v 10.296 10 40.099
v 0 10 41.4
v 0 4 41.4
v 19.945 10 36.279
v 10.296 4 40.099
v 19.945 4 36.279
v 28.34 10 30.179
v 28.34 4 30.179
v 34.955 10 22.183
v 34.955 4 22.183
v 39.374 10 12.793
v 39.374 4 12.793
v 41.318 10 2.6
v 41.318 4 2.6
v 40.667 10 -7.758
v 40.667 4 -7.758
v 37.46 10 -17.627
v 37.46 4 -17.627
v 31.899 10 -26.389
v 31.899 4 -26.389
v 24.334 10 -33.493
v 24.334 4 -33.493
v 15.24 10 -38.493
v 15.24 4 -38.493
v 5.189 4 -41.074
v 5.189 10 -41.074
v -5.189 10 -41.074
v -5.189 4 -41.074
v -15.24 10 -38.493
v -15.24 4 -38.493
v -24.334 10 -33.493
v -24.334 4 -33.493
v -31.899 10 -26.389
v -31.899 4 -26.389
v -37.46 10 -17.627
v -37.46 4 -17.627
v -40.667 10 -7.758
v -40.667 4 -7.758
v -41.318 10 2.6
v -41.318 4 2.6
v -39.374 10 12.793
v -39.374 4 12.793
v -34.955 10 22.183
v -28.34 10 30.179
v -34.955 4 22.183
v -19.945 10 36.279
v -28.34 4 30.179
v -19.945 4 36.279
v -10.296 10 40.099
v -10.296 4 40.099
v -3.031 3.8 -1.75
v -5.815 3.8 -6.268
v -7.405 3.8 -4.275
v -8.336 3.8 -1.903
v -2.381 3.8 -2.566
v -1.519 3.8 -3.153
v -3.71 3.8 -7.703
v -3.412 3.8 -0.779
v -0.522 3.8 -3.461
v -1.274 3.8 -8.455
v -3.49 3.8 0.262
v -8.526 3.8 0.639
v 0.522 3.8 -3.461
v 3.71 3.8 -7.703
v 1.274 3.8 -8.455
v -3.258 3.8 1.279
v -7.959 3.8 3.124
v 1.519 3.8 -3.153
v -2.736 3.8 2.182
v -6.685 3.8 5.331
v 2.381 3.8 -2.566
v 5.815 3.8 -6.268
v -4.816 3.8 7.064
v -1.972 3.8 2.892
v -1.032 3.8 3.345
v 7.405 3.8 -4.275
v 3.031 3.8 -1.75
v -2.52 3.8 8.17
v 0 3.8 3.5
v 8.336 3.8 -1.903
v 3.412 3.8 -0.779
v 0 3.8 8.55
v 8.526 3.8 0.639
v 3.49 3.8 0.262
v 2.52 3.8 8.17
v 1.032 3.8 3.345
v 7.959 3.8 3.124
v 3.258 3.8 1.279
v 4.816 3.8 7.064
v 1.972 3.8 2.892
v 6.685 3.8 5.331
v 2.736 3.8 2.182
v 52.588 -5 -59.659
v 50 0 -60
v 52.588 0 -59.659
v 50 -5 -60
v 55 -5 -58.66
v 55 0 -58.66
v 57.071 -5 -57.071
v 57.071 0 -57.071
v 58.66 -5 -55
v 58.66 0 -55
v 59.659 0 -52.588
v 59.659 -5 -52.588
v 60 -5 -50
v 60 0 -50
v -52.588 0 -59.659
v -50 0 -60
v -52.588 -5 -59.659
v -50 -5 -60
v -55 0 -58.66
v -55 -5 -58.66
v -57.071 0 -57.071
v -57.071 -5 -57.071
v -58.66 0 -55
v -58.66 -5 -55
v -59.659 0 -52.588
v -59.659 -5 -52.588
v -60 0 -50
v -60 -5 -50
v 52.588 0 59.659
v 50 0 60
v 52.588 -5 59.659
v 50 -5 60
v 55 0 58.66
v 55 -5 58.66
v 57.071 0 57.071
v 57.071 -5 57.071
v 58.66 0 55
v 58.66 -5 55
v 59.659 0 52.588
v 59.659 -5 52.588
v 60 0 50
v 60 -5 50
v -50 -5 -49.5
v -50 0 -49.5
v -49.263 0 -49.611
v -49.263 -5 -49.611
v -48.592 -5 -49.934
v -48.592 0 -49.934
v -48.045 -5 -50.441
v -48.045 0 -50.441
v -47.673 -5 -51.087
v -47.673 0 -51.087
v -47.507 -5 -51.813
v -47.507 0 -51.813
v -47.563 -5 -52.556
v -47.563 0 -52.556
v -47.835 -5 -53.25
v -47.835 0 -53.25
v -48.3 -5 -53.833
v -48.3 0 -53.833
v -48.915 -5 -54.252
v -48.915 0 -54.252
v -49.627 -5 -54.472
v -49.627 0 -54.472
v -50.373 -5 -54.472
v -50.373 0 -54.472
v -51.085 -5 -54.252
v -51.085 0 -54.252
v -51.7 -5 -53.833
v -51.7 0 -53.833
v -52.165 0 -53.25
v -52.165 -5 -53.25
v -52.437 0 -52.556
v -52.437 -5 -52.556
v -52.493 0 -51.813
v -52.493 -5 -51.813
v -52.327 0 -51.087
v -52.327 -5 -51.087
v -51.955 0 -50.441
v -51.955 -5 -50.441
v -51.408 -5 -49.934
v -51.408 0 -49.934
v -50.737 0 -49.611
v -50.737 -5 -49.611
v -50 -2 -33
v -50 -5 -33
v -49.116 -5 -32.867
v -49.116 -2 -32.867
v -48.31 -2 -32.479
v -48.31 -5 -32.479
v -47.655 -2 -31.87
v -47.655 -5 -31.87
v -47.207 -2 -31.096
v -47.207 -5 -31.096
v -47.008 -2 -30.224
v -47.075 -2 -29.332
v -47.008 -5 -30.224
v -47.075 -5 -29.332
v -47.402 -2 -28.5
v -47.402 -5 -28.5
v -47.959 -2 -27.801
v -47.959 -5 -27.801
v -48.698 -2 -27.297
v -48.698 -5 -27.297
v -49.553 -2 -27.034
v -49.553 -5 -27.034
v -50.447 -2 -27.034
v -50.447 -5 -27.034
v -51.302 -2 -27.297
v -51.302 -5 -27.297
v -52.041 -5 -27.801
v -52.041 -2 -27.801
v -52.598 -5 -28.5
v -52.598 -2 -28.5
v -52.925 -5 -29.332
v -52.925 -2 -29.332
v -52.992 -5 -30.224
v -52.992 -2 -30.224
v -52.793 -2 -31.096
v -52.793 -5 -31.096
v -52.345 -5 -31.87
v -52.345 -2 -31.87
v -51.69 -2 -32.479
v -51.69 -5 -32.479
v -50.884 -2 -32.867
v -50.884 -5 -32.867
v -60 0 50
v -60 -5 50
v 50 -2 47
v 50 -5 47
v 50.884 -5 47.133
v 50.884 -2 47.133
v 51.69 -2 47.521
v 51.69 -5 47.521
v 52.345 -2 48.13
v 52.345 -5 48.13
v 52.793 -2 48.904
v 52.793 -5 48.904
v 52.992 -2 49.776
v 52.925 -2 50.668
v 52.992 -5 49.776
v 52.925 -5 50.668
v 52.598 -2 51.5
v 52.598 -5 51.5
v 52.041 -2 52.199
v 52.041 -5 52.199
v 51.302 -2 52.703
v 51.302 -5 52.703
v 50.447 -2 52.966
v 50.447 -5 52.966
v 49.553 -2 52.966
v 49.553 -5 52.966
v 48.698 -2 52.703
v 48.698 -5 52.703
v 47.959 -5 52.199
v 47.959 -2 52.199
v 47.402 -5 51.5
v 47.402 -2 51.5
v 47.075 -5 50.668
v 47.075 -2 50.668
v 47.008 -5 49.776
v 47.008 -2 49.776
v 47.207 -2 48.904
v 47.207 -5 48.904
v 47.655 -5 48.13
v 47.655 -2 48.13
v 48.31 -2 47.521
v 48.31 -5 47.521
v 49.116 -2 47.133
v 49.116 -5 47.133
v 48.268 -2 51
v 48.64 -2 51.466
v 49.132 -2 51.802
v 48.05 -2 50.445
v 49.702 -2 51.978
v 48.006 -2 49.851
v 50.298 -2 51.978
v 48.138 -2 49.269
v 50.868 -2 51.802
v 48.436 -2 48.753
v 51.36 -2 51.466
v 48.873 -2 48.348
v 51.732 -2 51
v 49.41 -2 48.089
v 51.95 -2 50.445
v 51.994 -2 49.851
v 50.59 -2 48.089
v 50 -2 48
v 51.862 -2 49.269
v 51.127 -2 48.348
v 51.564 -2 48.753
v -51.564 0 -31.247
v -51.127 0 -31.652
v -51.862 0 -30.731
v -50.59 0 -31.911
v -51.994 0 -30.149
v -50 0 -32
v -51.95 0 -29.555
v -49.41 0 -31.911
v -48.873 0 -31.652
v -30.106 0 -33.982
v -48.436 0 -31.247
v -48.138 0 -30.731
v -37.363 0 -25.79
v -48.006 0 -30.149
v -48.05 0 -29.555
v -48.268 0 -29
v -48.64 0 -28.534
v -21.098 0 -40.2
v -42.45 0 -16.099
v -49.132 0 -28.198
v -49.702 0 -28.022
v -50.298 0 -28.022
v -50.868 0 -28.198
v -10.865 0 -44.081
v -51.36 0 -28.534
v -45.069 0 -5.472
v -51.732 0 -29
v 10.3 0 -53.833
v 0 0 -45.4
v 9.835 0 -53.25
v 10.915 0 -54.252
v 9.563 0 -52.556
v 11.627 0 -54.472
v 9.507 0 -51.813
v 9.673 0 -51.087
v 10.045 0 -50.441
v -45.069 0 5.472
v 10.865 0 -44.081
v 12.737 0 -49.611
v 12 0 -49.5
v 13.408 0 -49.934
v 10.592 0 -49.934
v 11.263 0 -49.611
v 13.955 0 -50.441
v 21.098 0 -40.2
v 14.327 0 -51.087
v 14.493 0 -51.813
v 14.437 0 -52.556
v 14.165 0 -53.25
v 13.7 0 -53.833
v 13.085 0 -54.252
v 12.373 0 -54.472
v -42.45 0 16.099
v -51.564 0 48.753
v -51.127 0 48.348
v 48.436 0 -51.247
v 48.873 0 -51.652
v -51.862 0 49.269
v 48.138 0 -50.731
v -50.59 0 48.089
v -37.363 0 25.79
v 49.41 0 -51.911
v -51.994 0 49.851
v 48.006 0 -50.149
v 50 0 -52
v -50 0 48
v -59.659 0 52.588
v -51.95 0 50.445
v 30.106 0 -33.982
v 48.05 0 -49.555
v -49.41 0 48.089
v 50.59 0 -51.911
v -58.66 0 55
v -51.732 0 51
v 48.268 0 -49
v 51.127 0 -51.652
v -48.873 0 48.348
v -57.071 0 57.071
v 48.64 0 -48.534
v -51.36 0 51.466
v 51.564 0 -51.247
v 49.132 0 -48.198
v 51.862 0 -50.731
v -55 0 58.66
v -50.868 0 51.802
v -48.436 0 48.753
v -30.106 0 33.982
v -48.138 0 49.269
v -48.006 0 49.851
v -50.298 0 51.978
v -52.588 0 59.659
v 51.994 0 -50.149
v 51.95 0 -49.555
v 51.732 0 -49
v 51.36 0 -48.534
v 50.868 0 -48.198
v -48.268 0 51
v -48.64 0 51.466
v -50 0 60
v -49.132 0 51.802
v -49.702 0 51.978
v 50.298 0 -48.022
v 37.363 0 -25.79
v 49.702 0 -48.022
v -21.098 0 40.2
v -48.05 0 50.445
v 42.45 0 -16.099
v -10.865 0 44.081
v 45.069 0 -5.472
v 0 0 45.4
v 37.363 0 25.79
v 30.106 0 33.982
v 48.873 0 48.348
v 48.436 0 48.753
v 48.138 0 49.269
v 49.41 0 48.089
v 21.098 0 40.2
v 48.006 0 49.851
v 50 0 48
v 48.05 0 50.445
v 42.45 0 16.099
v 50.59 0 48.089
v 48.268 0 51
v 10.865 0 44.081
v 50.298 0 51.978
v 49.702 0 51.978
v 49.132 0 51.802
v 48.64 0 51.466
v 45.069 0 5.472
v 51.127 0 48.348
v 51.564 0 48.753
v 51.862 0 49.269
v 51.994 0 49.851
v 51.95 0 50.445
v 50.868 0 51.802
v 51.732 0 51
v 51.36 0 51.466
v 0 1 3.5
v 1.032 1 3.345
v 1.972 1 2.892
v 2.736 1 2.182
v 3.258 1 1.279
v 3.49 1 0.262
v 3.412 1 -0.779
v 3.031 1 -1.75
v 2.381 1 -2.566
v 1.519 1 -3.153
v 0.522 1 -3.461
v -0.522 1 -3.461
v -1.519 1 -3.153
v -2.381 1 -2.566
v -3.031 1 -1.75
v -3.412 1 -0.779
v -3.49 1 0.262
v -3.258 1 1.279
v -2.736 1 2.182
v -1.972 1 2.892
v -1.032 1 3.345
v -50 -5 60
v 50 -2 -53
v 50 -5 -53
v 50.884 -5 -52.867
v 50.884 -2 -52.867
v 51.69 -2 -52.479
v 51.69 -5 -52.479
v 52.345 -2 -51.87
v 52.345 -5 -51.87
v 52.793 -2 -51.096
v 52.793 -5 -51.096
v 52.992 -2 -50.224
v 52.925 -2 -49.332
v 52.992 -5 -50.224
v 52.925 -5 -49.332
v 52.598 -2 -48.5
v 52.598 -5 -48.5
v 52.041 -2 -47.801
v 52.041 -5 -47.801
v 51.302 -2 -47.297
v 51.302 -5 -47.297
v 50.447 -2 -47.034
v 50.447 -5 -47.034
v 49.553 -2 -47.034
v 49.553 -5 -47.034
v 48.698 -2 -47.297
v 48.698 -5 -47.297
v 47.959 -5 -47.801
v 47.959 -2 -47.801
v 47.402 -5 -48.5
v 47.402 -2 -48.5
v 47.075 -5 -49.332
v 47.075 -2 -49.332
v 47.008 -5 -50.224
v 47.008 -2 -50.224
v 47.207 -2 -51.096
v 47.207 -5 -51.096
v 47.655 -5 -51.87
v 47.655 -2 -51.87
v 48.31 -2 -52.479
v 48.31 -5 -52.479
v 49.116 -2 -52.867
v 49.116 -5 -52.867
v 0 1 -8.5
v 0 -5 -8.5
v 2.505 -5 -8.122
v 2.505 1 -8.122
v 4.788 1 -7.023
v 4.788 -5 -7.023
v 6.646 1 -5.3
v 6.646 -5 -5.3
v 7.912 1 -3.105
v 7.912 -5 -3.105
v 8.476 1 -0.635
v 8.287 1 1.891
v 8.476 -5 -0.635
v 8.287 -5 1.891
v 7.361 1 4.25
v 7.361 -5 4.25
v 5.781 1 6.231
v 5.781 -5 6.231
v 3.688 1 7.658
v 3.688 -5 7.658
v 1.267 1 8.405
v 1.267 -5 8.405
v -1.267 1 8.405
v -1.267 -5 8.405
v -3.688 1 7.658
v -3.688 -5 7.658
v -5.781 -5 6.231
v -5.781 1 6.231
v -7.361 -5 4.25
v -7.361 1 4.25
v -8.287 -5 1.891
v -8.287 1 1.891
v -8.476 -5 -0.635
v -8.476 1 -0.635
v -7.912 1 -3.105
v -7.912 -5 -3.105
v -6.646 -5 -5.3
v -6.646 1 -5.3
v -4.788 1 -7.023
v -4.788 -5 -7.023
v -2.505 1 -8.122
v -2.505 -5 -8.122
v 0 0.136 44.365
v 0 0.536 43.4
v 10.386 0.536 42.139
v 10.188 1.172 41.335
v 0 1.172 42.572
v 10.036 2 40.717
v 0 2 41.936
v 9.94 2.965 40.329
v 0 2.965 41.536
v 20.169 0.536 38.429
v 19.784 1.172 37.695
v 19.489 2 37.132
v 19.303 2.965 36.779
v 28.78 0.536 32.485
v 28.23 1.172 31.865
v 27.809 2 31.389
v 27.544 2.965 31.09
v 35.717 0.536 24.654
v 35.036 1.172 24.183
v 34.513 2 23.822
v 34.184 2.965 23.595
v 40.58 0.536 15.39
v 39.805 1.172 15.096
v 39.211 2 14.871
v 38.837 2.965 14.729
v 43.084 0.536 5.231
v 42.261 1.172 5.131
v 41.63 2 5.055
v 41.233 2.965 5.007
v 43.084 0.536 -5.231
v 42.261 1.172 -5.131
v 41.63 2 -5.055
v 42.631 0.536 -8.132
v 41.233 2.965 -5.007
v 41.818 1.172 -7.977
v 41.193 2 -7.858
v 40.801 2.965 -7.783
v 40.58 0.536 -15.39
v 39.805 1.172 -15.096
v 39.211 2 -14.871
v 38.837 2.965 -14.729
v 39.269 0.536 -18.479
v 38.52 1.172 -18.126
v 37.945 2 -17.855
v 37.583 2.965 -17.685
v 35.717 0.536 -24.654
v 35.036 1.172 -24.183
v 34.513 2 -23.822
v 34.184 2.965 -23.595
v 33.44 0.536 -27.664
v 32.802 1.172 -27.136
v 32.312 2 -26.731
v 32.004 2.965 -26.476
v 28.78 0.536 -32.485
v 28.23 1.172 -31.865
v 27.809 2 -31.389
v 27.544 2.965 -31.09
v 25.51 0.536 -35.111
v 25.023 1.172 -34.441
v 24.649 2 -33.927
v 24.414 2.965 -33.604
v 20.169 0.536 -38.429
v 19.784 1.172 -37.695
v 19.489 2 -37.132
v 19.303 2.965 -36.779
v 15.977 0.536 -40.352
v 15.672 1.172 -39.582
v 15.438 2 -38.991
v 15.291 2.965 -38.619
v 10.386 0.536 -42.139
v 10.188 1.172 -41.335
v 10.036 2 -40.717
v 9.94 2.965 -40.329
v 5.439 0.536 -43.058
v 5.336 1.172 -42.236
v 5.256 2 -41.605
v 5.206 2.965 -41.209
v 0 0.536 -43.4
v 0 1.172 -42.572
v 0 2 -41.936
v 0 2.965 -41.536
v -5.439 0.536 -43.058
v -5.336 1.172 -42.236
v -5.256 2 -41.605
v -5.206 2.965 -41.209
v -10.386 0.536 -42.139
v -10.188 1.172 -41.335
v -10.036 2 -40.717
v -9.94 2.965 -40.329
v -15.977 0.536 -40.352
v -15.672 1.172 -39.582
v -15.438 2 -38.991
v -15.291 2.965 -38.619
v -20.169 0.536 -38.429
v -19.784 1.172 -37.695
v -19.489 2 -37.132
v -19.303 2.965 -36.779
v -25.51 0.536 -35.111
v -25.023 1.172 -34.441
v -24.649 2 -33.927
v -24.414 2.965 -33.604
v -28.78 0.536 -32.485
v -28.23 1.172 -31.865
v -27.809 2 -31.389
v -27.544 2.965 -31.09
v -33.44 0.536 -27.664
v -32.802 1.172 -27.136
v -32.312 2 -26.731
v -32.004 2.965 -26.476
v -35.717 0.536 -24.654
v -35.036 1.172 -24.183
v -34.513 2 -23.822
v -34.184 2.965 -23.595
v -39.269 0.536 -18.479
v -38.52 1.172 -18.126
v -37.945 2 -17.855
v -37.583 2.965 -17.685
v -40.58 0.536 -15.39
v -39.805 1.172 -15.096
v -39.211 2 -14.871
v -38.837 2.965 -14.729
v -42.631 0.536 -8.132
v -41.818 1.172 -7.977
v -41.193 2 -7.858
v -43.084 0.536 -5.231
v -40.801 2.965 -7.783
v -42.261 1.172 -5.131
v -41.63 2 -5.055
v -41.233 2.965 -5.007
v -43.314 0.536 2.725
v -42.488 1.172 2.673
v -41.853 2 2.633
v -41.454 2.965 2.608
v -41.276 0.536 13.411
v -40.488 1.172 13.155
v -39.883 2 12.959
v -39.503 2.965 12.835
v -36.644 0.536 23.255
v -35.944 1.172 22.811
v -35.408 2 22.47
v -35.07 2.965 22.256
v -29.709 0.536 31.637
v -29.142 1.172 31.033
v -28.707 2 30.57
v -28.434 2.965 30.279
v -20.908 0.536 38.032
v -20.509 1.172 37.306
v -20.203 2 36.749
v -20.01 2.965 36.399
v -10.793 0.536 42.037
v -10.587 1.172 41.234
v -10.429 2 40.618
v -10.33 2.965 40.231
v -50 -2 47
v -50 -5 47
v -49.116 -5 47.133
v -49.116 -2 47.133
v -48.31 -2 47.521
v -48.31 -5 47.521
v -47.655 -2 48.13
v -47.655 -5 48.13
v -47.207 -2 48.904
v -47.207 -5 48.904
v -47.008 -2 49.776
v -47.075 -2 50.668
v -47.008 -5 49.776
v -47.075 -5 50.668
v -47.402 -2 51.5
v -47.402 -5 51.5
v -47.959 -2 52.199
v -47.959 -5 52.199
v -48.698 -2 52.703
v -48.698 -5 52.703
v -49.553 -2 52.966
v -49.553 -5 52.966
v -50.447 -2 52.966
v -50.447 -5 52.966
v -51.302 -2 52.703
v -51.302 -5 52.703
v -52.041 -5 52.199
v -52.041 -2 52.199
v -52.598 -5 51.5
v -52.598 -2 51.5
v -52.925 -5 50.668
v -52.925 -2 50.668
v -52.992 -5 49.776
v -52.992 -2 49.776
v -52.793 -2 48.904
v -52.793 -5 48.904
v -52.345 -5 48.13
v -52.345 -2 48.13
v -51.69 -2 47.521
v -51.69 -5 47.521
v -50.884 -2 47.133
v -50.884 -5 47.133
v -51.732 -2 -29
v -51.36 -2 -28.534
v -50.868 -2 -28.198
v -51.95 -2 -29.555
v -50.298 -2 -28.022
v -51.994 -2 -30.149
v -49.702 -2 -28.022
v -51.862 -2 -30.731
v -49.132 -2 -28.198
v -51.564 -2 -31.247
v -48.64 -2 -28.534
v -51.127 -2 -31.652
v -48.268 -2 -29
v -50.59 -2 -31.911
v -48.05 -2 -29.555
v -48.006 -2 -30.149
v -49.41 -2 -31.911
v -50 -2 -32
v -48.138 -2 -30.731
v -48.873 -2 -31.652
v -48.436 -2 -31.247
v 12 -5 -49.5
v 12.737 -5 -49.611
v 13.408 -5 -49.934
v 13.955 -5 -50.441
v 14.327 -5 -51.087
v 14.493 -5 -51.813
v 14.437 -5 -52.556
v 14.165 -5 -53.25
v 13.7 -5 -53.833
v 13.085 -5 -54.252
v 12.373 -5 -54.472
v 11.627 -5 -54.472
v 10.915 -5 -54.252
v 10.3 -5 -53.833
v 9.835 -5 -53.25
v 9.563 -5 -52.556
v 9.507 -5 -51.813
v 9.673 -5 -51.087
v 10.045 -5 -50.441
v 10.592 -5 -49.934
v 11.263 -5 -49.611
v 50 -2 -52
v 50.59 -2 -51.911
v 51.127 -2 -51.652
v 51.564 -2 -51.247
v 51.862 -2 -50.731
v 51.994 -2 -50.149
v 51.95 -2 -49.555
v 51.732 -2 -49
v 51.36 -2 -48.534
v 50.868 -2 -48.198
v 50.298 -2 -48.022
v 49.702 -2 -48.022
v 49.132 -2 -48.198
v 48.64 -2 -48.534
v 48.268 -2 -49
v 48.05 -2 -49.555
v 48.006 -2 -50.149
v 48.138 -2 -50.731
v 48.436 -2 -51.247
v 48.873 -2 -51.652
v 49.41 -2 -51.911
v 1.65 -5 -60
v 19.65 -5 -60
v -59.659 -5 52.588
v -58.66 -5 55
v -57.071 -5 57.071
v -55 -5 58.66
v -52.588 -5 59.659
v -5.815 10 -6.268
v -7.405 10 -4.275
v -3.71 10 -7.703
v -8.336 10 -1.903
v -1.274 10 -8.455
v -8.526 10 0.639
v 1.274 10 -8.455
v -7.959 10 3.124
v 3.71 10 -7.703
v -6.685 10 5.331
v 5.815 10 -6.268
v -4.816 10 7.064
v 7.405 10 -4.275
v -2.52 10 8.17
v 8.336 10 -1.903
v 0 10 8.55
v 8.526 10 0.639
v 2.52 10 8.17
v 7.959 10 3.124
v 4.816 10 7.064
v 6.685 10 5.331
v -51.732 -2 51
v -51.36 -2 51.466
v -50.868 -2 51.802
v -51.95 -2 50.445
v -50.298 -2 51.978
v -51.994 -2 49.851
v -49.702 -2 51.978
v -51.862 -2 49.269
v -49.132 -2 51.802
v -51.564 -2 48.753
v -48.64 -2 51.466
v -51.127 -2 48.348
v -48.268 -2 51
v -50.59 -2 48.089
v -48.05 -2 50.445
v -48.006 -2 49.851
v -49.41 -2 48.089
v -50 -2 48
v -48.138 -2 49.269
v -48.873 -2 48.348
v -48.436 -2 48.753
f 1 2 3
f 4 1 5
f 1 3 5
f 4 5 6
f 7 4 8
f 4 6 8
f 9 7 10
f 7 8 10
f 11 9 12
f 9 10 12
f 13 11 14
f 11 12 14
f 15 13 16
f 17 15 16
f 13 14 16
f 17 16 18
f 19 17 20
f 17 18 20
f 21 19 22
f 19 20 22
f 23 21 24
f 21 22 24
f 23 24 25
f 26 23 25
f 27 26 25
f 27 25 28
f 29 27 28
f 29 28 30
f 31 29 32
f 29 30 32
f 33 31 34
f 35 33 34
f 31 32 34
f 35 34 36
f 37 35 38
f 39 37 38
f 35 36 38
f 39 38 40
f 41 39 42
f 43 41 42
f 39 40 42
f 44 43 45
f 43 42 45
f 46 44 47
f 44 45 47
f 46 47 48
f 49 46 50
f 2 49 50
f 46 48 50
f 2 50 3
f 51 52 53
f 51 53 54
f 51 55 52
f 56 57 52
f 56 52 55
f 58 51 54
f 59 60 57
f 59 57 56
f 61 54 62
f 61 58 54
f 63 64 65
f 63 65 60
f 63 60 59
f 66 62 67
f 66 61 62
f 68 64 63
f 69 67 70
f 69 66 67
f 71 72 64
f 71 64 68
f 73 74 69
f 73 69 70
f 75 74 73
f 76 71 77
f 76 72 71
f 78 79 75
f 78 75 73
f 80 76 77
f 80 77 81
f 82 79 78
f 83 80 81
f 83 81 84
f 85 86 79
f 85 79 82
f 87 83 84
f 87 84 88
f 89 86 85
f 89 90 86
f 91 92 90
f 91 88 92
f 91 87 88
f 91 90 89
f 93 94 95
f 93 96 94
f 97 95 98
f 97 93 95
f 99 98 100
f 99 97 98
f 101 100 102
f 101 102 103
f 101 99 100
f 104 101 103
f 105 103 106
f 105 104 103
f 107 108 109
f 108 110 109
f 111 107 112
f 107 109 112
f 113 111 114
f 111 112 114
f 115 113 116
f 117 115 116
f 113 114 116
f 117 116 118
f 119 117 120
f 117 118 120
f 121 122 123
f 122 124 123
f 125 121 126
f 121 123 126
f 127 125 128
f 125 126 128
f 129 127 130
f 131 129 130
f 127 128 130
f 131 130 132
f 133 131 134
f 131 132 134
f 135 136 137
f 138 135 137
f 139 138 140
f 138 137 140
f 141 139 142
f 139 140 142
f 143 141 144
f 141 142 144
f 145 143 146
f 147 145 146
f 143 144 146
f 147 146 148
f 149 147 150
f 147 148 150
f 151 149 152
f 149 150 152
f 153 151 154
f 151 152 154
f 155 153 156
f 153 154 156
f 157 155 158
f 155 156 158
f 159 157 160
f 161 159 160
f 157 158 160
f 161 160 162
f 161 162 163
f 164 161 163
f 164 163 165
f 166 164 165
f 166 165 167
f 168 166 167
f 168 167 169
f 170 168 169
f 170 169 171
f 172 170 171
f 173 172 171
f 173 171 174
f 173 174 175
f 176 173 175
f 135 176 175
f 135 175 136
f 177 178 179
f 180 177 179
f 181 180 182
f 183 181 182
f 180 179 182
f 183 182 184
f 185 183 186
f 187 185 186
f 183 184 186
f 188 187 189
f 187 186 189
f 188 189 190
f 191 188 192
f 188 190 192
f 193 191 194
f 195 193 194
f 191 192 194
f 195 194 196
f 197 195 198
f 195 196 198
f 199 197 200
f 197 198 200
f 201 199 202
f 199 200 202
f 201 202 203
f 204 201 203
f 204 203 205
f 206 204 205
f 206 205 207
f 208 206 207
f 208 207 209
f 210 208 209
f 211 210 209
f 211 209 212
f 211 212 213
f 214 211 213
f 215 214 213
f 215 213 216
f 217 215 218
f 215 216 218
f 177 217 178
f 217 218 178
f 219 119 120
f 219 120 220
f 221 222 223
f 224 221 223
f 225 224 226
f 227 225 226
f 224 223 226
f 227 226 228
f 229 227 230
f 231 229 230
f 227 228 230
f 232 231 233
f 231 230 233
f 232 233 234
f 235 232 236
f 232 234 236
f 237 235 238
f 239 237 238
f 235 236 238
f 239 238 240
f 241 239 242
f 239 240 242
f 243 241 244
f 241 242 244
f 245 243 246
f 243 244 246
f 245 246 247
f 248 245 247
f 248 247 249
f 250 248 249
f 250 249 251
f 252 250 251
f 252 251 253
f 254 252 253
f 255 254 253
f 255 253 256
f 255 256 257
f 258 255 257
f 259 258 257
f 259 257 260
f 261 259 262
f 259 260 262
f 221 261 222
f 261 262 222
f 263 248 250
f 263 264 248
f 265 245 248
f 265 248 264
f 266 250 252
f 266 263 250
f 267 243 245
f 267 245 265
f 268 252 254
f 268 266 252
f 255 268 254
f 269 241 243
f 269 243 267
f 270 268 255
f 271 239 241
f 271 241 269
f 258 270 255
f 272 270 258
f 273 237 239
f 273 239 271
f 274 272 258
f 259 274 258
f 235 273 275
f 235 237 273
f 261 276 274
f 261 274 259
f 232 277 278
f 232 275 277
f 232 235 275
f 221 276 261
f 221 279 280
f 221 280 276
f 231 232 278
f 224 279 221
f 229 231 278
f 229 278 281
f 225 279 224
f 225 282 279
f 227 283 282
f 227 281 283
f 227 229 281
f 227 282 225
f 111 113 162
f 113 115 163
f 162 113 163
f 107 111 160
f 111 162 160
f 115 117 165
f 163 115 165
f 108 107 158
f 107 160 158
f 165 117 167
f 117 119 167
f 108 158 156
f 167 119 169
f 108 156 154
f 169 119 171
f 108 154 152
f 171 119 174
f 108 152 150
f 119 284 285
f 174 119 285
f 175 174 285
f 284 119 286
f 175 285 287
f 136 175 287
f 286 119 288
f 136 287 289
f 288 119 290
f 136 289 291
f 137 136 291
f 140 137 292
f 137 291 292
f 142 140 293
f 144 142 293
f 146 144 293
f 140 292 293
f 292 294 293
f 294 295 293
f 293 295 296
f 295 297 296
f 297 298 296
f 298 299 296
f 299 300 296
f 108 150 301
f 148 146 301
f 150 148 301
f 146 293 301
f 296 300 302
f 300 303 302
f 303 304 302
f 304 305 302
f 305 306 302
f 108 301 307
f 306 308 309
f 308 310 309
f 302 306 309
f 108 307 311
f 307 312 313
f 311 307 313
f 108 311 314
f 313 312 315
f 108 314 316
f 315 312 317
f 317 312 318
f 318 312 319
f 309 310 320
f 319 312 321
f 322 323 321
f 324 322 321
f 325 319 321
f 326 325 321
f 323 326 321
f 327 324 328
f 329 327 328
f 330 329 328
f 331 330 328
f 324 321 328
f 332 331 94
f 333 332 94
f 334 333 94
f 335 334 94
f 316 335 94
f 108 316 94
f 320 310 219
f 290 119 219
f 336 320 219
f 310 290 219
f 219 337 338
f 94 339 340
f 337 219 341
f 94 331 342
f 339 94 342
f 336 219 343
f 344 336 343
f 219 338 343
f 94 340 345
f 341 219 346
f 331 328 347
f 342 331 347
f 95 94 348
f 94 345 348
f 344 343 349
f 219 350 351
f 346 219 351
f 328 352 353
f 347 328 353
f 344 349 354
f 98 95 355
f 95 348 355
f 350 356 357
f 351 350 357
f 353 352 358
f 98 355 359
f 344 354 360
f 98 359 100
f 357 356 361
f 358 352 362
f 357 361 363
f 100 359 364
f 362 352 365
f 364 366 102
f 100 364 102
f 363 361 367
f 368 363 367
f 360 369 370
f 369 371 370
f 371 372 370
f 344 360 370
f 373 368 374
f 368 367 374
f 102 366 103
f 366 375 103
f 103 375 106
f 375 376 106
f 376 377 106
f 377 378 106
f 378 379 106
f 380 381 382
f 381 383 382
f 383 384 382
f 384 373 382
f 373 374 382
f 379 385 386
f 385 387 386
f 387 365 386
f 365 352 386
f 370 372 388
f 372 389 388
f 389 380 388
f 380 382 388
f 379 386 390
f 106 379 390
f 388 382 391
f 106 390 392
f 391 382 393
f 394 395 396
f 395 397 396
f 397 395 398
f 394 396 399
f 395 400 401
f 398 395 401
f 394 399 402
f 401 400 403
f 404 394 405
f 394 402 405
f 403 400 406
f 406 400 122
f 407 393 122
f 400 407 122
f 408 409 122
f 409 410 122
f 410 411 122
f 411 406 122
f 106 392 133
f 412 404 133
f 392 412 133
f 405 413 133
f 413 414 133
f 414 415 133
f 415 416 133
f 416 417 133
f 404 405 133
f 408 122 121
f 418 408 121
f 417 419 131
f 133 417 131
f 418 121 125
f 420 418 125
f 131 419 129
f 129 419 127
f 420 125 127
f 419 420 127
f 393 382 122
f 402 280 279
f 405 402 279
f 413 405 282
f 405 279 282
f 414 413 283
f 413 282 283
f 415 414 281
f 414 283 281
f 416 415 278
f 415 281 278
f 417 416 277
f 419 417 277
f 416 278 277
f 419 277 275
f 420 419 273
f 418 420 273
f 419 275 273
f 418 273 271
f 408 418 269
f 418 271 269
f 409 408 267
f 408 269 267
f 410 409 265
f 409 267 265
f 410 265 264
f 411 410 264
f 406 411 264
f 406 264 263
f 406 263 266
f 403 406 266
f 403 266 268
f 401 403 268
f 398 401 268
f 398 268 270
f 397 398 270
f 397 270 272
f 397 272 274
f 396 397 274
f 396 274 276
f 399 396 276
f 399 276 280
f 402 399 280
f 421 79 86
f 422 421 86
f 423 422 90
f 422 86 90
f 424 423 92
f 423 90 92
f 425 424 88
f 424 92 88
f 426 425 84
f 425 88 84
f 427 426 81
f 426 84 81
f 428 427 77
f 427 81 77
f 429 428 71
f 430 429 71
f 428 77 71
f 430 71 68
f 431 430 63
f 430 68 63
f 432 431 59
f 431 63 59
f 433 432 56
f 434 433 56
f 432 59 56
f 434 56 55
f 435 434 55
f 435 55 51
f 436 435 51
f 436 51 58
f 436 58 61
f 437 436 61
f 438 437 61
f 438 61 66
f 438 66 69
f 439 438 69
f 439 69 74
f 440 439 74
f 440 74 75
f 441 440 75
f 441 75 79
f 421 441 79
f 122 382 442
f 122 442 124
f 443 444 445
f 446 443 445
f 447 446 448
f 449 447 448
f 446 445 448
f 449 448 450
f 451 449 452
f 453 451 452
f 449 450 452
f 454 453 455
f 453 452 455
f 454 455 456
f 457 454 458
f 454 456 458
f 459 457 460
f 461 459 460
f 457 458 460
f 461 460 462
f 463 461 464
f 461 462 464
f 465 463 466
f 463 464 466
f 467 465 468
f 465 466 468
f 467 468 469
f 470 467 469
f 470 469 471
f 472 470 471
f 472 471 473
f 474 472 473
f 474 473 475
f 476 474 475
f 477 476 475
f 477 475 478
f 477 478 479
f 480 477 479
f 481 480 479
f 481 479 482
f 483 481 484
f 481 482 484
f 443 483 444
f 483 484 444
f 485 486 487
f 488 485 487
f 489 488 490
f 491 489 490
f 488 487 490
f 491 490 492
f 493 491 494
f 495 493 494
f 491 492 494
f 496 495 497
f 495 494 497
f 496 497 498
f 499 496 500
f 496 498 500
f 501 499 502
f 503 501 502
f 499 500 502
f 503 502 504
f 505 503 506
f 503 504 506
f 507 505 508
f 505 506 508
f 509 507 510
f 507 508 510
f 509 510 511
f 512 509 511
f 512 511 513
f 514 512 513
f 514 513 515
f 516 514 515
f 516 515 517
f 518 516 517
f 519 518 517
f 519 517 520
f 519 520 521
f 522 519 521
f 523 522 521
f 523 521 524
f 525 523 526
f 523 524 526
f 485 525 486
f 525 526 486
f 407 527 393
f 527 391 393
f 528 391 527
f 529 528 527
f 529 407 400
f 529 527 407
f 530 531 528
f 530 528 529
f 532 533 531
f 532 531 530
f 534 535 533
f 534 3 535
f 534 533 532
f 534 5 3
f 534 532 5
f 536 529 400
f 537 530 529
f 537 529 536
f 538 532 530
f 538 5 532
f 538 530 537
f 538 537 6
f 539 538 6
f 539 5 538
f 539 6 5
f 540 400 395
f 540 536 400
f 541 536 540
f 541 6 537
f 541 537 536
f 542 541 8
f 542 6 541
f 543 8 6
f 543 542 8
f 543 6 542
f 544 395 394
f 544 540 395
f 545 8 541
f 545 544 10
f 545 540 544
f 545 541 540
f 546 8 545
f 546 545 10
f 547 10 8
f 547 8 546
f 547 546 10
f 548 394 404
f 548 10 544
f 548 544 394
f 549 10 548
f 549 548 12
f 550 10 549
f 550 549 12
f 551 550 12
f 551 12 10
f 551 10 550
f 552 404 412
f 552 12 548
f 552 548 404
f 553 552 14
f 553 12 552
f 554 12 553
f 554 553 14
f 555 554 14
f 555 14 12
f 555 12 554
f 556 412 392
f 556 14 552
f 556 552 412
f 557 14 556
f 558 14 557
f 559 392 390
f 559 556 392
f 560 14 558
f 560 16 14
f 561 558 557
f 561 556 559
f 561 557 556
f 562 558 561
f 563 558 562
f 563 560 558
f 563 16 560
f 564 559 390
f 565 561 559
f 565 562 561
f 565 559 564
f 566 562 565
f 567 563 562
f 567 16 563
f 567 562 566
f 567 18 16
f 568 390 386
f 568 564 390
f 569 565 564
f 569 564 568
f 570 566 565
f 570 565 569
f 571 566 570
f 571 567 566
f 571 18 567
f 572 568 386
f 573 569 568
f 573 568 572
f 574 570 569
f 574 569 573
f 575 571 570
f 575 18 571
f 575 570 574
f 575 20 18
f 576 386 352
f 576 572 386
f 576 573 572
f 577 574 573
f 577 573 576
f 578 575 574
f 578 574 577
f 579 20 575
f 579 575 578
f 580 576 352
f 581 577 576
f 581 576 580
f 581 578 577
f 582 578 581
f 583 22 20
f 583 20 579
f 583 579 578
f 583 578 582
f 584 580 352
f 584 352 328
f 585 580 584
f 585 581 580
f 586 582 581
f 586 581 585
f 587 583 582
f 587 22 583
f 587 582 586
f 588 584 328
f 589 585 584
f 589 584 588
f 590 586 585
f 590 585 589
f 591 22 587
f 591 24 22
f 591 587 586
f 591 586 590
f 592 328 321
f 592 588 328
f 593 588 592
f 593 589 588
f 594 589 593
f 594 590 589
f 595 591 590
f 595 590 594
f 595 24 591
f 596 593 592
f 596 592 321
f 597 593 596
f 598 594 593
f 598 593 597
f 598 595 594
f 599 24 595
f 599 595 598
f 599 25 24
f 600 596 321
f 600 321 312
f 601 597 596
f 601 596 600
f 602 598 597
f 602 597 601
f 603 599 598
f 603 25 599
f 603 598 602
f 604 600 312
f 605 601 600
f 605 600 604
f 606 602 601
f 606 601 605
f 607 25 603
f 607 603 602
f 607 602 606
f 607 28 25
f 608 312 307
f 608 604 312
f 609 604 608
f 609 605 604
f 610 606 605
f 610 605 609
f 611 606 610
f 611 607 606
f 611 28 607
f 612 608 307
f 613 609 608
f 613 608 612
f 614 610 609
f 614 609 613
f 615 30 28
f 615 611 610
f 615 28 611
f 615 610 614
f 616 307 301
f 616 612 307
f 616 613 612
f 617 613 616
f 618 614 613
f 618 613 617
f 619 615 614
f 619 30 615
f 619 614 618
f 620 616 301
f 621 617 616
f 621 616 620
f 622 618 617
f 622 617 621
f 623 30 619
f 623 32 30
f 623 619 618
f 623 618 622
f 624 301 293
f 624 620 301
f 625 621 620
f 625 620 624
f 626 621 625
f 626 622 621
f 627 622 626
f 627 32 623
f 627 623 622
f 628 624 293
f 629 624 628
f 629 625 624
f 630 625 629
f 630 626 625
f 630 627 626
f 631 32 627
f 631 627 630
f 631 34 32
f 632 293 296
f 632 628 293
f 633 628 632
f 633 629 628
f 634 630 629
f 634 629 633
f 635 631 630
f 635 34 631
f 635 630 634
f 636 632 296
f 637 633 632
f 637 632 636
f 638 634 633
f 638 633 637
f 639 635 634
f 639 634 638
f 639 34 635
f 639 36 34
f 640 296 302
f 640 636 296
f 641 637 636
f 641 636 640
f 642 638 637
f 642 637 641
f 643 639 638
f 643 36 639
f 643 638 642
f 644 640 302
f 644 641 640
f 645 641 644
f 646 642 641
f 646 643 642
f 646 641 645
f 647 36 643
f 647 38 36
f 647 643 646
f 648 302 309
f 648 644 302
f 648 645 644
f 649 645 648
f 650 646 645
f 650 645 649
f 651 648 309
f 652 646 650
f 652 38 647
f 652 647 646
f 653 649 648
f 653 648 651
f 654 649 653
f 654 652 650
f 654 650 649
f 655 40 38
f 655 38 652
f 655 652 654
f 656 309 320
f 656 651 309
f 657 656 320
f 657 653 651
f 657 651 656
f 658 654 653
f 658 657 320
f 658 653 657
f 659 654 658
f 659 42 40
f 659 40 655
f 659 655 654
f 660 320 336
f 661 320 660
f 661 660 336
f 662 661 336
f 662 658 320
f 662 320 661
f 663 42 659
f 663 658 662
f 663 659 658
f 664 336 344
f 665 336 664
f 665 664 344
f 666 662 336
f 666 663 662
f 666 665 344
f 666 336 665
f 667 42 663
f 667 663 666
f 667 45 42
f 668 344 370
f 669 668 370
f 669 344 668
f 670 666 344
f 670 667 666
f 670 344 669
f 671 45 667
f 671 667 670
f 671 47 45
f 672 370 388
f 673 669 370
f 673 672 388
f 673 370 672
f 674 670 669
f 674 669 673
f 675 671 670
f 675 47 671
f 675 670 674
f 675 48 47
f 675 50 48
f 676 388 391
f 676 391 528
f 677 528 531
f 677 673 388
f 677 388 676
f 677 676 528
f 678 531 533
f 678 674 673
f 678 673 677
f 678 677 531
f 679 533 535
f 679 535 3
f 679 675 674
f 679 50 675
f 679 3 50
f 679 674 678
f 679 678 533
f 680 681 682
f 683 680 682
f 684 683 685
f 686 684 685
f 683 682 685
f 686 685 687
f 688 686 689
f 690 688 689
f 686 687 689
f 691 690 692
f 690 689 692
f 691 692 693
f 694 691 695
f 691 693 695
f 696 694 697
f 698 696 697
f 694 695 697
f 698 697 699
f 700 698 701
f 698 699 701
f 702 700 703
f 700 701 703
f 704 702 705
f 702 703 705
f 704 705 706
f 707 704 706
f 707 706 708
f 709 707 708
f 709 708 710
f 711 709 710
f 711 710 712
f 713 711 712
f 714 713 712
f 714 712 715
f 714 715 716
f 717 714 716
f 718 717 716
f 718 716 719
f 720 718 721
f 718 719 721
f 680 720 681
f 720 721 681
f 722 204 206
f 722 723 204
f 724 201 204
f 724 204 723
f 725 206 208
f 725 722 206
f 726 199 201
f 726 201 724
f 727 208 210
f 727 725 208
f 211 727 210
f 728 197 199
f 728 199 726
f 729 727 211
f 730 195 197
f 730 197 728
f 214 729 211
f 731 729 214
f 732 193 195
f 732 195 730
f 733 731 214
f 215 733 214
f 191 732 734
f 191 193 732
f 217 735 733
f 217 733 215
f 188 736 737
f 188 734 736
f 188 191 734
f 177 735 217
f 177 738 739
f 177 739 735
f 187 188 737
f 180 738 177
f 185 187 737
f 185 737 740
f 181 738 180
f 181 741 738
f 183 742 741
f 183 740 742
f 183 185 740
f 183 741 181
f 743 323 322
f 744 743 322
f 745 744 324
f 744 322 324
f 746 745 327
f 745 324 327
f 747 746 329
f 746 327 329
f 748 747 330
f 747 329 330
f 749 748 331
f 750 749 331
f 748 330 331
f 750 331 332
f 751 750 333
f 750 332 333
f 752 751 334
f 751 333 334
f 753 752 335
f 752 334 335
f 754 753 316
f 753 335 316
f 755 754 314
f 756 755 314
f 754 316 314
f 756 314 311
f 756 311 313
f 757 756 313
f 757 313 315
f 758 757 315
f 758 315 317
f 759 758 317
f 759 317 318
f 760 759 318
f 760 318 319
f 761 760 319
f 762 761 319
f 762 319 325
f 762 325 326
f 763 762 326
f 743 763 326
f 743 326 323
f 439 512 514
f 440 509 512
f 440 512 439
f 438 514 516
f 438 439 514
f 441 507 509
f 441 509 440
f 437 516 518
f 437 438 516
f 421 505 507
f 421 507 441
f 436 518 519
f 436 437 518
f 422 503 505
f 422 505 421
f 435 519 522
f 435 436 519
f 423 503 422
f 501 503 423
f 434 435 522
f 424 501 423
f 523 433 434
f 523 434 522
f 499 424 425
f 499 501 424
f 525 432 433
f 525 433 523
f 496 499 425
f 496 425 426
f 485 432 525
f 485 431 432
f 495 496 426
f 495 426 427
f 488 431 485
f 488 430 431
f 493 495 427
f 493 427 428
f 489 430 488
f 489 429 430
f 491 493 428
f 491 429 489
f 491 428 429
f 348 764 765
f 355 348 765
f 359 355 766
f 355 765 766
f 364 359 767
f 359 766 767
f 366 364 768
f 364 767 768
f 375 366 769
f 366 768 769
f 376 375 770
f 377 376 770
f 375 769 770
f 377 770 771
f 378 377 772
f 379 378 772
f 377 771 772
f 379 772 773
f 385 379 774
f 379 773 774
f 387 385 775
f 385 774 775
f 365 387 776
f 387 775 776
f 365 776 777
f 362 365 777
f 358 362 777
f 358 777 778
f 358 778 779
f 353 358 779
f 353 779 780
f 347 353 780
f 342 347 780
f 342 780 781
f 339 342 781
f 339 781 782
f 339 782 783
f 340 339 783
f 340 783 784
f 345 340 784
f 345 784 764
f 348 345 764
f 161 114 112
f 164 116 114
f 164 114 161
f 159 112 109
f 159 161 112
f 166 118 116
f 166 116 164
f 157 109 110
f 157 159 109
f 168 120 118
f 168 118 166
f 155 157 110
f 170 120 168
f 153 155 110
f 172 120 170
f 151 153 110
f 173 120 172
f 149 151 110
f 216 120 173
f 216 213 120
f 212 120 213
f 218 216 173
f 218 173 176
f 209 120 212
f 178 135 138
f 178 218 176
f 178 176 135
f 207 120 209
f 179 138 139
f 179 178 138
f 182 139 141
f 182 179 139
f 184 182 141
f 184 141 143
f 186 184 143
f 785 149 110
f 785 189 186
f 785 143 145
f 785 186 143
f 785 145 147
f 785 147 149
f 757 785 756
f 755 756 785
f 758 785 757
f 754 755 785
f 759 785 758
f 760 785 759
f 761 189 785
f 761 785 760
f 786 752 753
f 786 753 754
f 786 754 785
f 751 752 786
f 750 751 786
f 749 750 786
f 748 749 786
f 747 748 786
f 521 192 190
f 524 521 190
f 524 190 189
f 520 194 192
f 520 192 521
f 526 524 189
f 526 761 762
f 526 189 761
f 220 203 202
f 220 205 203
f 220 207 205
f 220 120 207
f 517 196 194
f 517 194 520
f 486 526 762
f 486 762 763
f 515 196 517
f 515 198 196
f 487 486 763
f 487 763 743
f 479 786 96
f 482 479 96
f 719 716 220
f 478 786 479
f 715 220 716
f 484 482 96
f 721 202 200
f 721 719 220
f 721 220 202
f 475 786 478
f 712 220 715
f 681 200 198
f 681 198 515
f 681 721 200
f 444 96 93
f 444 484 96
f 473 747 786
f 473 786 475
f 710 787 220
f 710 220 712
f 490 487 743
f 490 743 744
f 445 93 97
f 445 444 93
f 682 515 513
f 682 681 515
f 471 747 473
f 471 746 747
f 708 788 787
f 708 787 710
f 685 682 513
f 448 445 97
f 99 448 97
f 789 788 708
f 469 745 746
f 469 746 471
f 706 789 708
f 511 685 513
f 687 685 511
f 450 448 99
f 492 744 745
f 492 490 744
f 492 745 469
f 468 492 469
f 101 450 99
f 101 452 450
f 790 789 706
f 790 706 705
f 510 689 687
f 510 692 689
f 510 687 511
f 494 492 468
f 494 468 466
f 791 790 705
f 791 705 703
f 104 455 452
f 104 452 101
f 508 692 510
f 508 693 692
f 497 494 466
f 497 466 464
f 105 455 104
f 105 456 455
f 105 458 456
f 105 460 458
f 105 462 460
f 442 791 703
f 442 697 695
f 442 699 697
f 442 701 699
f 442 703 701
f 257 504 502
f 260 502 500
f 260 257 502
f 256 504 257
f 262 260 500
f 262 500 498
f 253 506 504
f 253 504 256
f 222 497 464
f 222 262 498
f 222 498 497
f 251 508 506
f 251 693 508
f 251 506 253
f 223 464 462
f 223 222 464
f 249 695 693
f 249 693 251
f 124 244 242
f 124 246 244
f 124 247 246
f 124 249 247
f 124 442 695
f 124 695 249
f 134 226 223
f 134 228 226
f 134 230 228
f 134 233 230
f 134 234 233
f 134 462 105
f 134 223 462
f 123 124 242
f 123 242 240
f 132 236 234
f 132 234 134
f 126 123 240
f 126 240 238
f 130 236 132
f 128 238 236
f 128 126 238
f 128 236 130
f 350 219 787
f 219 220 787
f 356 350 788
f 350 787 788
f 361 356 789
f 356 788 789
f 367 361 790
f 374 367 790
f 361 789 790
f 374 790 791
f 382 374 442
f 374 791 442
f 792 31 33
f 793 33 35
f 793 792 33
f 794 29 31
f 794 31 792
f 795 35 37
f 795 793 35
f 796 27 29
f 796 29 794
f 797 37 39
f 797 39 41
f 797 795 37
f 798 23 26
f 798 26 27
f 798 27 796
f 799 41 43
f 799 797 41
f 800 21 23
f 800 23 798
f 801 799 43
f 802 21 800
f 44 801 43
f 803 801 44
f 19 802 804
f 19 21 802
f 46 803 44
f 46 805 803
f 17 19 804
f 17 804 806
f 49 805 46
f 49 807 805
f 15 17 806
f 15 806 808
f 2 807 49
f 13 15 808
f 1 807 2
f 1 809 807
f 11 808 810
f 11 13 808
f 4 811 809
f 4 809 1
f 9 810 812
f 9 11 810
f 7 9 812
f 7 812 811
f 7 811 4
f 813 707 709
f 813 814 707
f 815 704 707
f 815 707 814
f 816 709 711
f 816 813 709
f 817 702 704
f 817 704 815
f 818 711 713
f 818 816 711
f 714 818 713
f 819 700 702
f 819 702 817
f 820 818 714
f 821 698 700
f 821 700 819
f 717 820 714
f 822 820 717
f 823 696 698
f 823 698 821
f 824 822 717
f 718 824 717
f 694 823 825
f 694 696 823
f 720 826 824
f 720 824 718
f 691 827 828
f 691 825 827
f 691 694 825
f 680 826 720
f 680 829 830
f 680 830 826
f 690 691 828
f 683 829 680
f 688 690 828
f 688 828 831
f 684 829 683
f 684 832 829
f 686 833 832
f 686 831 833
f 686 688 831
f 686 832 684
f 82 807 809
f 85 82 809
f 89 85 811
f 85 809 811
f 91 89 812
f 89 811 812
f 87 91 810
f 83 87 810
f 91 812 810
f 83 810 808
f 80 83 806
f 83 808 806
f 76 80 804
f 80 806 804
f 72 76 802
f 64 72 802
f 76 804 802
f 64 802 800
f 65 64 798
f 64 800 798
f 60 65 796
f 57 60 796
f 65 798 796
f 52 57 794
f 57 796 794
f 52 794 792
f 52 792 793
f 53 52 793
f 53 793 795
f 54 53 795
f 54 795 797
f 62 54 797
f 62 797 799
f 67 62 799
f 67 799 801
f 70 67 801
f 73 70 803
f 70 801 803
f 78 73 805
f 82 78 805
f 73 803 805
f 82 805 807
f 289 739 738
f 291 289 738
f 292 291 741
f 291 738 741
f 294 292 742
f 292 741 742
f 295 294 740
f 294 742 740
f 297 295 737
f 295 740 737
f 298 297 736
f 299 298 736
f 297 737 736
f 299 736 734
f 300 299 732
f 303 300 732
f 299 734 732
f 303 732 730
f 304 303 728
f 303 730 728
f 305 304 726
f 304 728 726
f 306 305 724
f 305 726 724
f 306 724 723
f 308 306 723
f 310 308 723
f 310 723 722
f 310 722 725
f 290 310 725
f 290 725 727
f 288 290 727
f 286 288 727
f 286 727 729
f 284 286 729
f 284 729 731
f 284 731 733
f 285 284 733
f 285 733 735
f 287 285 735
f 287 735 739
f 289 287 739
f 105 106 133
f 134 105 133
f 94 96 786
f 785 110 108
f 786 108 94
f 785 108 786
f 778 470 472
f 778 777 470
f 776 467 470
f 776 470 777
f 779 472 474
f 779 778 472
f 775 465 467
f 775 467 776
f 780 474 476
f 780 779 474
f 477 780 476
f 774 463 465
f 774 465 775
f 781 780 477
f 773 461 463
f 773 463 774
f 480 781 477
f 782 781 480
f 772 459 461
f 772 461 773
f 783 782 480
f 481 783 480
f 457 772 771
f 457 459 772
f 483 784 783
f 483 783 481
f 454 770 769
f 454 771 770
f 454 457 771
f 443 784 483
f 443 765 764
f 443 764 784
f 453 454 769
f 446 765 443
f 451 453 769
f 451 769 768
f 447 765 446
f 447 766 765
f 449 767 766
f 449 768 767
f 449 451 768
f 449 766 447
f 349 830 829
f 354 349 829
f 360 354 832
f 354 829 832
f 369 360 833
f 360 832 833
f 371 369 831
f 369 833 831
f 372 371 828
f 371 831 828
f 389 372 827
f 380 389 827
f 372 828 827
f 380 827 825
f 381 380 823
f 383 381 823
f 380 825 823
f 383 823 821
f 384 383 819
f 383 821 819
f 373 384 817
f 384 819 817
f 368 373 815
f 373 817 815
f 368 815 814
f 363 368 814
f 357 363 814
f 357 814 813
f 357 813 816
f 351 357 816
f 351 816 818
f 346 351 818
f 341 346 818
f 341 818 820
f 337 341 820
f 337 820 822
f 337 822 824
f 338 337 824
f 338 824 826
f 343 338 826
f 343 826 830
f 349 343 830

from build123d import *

# Parameters (mm, degrees)
CROQUIS1_R              = 41.4
SALIENTE_EXTRUIR1_DEPTH = 10
CROQUIS3_W              = 120
CROQUIS3_H              = 120
SALIENTE_EXTRUIR2_DEPTH = 5
CROQUIS2_R              = 3.5
CORTAR_EXTRUIR1_DEPTH   = 87.168439698
CROQUIS4_R              = 8.5
CORTAR_EXTRUIR2_DEPTH   = 6
CROQUIS5_W              = 42.3
CROQUIS5_H              = 42.3
SALIENTE_EXTRUIR3_DEPTH = 5
REDONDEO1_R             = 4
CORTAR_EXTRUIR3_REACH   = 134.292
CROQUIS8_R              = 2
CROQUIS8_R_2            = 11.5
CROQUIS9_R              = 3
CORTAR_EXTRUIR4_DEPTH   = 3
CORTAR_EXTRUIR5_REACH   = 98.188
CROQUIS10_R             = 2
CROQUIS11_W             = 17
CROQUIS11_H             = 42.3
SALIENTE_EXTRUIR4_DEPTH = 3
CROQUIS12_W             = 17
CROQUIS12_H             = 42.3
SALIENTE_EXTRUIR5_DEPTH = 3
CROQUIS15_W             = 17
CROQUIS15_H             = 3
SALIENTE_EXTRUIR6_DEPTH = 14
CROQUIS16_W             = 17
CROQUIS16_H             = 3
SALIENTE_EXTRUIR7_DEPTH = 15
CROQUIS13_R             = 2.5
CORTAR_EXTRUIR6_DEPTH   = 10
CROQUIS17_W             = 139.545471549
CROQUIS17_H             = 43.797559685
CORTAR_EXTRUIR7_DEPTH   = 120
REDONDEO2_R             = 10
REDONDEO3_R             = 10
REDONDEO4_R             = 10
REDONDEO5_R             = 10
CROQUIS18_R             = 8.55
CORTAR_EXTRUIR8_DEPTH   = 6.2


with BuildPart() as part:
    # Croquis1 → Saliente-Extruir1 (new body)
    with BuildSketch(Plane(origin=(0, 0, 0), x_dir=(1, 0, 0), z_dir=(0, 1, 0))):
        with Locations(Location((0, 0, 0), (0, 0, 270))):
            Circle(CROQUIS1_R)
    extrude(amount=SALIENTE_EXTRUIR1_DEPTH)

    # Croquis3 → Saliente-Extruir2 (add)
    with BuildSketch(Plane.XZ):
        Rectangle(CROQUIS3_W, CROQUIS3_H)
    extrude(amount=SALIENTE_EXTRUIR2_DEPTH)

    # Croquis2 → Cortar-Extruir1 (cut, through all)
    with BuildSketch(Plane(origin=(0, 10, 0), x_dir=(1, 0, 0), z_dir=(0, 1, 0))):
        with Locations(Location((0, 0, 0), (0, 0, 270))):
            Circle(CROQUIS2_R)
    extrude(amount=-CORTAR_EXTRUIR1_DEPTH, mode=Mode.SUBTRACT)

    # Croquis4 → Cortar-Extruir2 (cut)
    with BuildSketch(Plane.XZ.offset(5)):
        with Locations(Location((0, 0, 0), (0, 0, 270))):
            Circle(CROQUIS4_R)
    extrude(amount=-CORTAR_EXTRUIR2_DEPTH, mode=Mode.SUBTRACT)

    # Croquis5 → Saliente-Extruir3 (add)
    with BuildSketch(Plane.XY.offset(-43)):
        with Locations((-19.5, -26.15)):
            Rectangle(CROQUIS5_W, CROQUIS5_H)
    extrude(amount=-SALIENTE_EXTRUIR3_DEPTH)

    # Redondeo1
    redondeo1_edges = [part.edges().sort_by_distance(p)[0] for p in [
        (0, 0, -41.4),
    ]]
    fillet(redondeo1_edges, radius=REDONDEO1_R)

    # Croquis8 → Cortar-Extruir3 (cut, up to next)
    with BuildSketch(Plane(origin=(0, 0, -48), x_dir=(-1, 0, 0), z_dir=(0, 0, -1)), mode=Mode.PRIVATE) as cortar_extruir3_sk1:
        with Locations((4, -10.65)):
            Circle(CROQUIS8_R)
    cortar_extruir3_tool1 = extrude(cortar_extruir3_sk1.sketch, amount=-CORTAR_EXTRUIR3_REACH, mode=Mode.PRIVATE) & part.part
    # Croquis8 → Cortar-Extruir3 (cut, up to next)
    with BuildSketch(Plane(origin=(0, 0, -48), x_dir=(-1, 0, 0), z_dir=(0, 0, -1)), mode=Mode.PRIVATE) as cortar_extruir3_sk2:
        with Locations((35, -10.65)):
            Circle(CROQUIS8_R)
    cortar_extruir3_tool2 = extrude(cortar_extruir3_sk2.sketch, amount=-CORTAR_EXTRUIR3_REACH, mode=Mode.PRIVATE) & part.part
    # Croquis8 → Cortar-Extruir3 (cut, up to next)
    with BuildSketch(Plane(origin=(0, 0, -48), x_dir=(-1, 0, 0), z_dir=(0, 0, -1)), mode=Mode.PRIVATE) as cortar_extruir3_sk3:
        with Locations((35, -41.65)):
            Circle(CROQUIS8_R)
    cortar_extruir3_tool3 = extrude(cortar_extruir3_sk3.sketch, amount=-CORTAR_EXTRUIR3_REACH, mode=Mode.PRIVATE) & part.part
    # Croquis8 → Cortar-Extruir3 (cut, up to next)
    with BuildSketch(Plane(origin=(0, 0, -48), x_dir=(-1, 0, 0), z_dir=(0, 0, -1)), mode=Mode.PRIVATE) as cortar_extruir3_sk4:
        with Locations((4, -41.65)):
            Circle(CROQUIS8_R)
    cortar_extruir3_tool4 = extrude(cortar_extruir3_sk4.sketch, amount=-CORTAR_EXTRUIR3_REACH, mode=Mode.PRIVATE) & part.part
    # Croquis8 → Cortar-Extruir3 (cut, up to next)
    with BuildSketch(Plane(origin=(0, 0, -48), x_dir=(-1, 0, 0), z_dir=(0, 0, -1)), mode=Mode.PRIVATE) as cortar_extruir3_sk5:
        with Locations((19.5, -26.15)):
            Circle(CROQUIS8_R_2)
    cortar_extruir3_tool5 = extrude(cortar_extruir3_sk5.sketch, amount=-CORTAR_EXTRUIR3_REACH, mode=Mode.PRIVATE) & part.part
    add(cortar_extruir3_tool1.solids().sort_by_distance((-4, -10.65, -48))[0], mode=Mode.SUBTRACT)
    add(cortar_extruir3_tool2.solids().sort_by_distance((-35, -10.65, -48))[0], mode=Mode.SUBTRACT)
    add(cortar_extruir3_tool3.solids().sort_by_distance((-35, -41.65, -48))[0], mode=Mode.SUBTRACT)
    add(cortar_extruir3_tool4.solids().sort_by_distance((-4, -41.65, -48))[0], mode=Mode.SUBTRACT)
    add(cortar_extruir3_tool5.solids().sort_by_distance((-19.5, -26.15, -48))[0], mode=Mode.SUBTRACT)

    # Croquis9 → Cortar-Extruir4 (cut)
    with BuildSketch(Plane.XZ.offset(5)):
        with Locations(Location((-50, 50, 0), (0, 0, 270))):
            Circle(CROQUIS9_R)
        with Locations(Location((50, 50, 0), (0, 0, 270))):
            Circle(CROQUIS9_R)
        with Locations(Location((50, -50, 0), (0, 0, 270))):
            Circle(CROQUIS9_R)
        with Locations(Location((-50, -30, 0), (0, 0, 270))):
            Circle(CROQUIS9_R)
    extrude(amount=-CORTAR_EXTRUIR4_DEPTH, mode=Mode.SUBTRACT)

    # Croquis10 → Cortar-Extruir5 (cut, up to next)
    with BuildSketch(Plane.XZ.offset(2), mode=Mode.PRIVATE) as cortar_extruir5_sk1:
        with Locations(Location((-50, 50, 0), (0, 0, 270))):
            Circle(CROQUIS10_R)
    cortar_extruir5_tool1 = extrude(cortar_extruir5_sk1.sketch, amount=-CORTAR_EXTRUIR5_REACH, mode=Mode.PRIVATE) & part.part
    # Croquis10 → Cortar-Extruir5 (cut, up to next)
    with BuildSketch(Plane.XZ.offset(2), mode=Mode.PRIVATE) as cortar_extruir5_sk2:
        with Locations(Location((50, 50, 0), (0, 0, 270))):
            Circle(CROQUIS10_R)
    cortar_extruir5_tool2 = extrude(cortar_extruir5_sk2.sketch, amount=-CORTAR_EXTRUIR5_REACH, mode=Mode.PRIVATE) & part.part
    # Croquis10 → Cortar-Extruir5 (cut, up to next)
    with BuildSketch(Plane.XZ.offset(2), mode=Mode.PRIVATE) as cortar_extruir5_sk3:
        with Locations(Location((50, -50, 0), (0, 0, 270))):
            Circle(CROQUIS10_R)
    cortar_extruir5_tool3 = extrude(cortar_extruir5_sk3.sketch, amount=-CORTAR_EXTRUIR5_REACH, mode=Mode.PRIVATE) & part.part
    # Croquis10 → Cortar-Extruir5 (cut, up to next)
    with BuildSketch(Plane.XZ.offset(2), mode=Mode.PRIVATE) as cortar_extruir5_sk4:
        with Locations(Location((-50, -30, 0), (0, 0, 270))):
            Circle(CROQUIS10_R)
    cortar_extruir5_tool4 = extrude(cortar_extruir5_sk4.sketch, amount=-CORTAR_EXTRUIR5_REACH, mode=Mode.PRIVATE) & part.part
    add(cortar_extruir5_tool1.solids().sort_by_distance((-50, -2, 50))[0], mode=Mode.SUBTRACT)
    add(cortar_extruir5_tool2.solids().sort_by_distance((50, -2, 50))[0], mode=Mode.SUBTRACT)
    add(cortar_extruir5_tool3.solids().sort_by_distance((50, -2, -50))[0], mode=Mode.SUBTRACT)
    add(cortar_extruir5_tool4.solids().sort_by_distance((-50, -2, -30))[0], mode=Mode.SUBTRACT)

    # Croquis11 → Saliente-Extruir4 (add)
    with BuildSketch(Plane(origin=(1.65, 0, 0), x_dir=(0, 0, -1), z_dir=(1, 0, 0))):
        with Locations((51.5, -26.15)):
            Rectangle(CROQUIS11_W, CROQUIS11_H)
    extrude(amount=SALIENTE_EXTRUIR4_DEPTH)

    # Croquis12 → Saliente-Extruir5 (add)
    with BuildSketch(Plane.ZY.offset(40.65)):
        with Locations((-51.5, -26.15)):
            Rectangle(CROQUIS12_W, CROQUIS12_H)
    extrude(amount=SALIENTE_EXTRUIR5_DEPTH)

    # Croquis15 → Saliente-Extruir6 (add)
    with BuildSketch(Plane.ZY.offset(43.65)):
        with Locations((-51.5, -6.5)):
            Rectangle(CROQUIS15_W, CROQUIS15_H)
    extrude(amount=SALIENTE_EXTRUIR6_DEPTH)

    # Croquis16 → Saliente-Extruir7 (add)
    with BuildSketch(Plane(origin=(4.65, 0, 0), x_dir=(0, 0, -1), z_dir=(1, 0, 0))):
        with Locations((51.5, -6.5)):
            Rectangle(CROQUIS16_W, CROQUIS16_H)
    extrude(amount=SALIENTE_EXTRUIR7_DEPTH)

    # Croquis13 → Cortar-Extruir6 (cut)
    with BuildSketch(Plane(origin=(0, 0, 0), x_dir=(1, 0, 0), z_dir=(0, 1, 0))):
        with Locations(Location((-50, 52, 0), (0, 0, 270))):
            Circle(CROQUIS13_R)
        with Locations(Location((12, 52, 0), (0, 0, 270))):
            Circle(CROQUIS13_R)
    extrude(amount=-CORTAR_EXTRUIR6_DEPTH, mode=Mode.SUBTRACT)

    # Croquis17 → Cortar-Extruir7 (cut)
    with BuildSketch(Plane(origin=(0, 0, -60), x_dir=(-1, 0, 0), z_dir=(0, 0, -1))):
        with Locations((9.772735774, -26.898779843)):
            Rectangle(CROQUIS17_W, CROQUIS17_H)
    extrude(amount=-CORTAR_EXTRUIR7_DEPTH, mode=Mode.SUBTRACT)

    # Redondeo2
    redondeo2_edges = [part.edges().sort_by_distance(p)[0] for p in [
        (60, -2.5, -60),
    ]]
    fillet(redondeo2_edges, radius=REDONDEO2_R)

    # Redondeo3
    redondeo3_edges = [part.edges().sort_by_distance(p)[0] for p in [
        (-60, -2.5, -60),
    ]]
    fillet(redondeo3_edges, radius=REDONDEO3_R)

    # Redondeo4
    redondeo4_edges = [part.edges().sort_by_distance(p)[0] for p in [
        (-60, -2.5, 60),
    ]]
    fillet(redondeo4_edges, radius=REDONDEO4_R)

    # Redondeo5
    redondeo5_edges = [part.edges().sort_by_distance(p)[0] for p in [
        (60, -2.5, 60),
    ]]
    fillet(redondeo5_edges, radius=REDONDEO5_R)

    # Croquis18 → Cortar-Extruir8 (cut)
    with BuildSketch(Plane(origin=(0, 10, 0), x_dir=(1, 0, 0), z_dir=(0, 1, 0))):
        with Locations(Location((0, 0, 0), (0, 0, 270))):
            Circle(CROQUIS18_R)
    extrude(amount=-CORTAR_EXTRUIR8_DEPTH, mode=Mode.SUBTRACT)


solid = part.part
